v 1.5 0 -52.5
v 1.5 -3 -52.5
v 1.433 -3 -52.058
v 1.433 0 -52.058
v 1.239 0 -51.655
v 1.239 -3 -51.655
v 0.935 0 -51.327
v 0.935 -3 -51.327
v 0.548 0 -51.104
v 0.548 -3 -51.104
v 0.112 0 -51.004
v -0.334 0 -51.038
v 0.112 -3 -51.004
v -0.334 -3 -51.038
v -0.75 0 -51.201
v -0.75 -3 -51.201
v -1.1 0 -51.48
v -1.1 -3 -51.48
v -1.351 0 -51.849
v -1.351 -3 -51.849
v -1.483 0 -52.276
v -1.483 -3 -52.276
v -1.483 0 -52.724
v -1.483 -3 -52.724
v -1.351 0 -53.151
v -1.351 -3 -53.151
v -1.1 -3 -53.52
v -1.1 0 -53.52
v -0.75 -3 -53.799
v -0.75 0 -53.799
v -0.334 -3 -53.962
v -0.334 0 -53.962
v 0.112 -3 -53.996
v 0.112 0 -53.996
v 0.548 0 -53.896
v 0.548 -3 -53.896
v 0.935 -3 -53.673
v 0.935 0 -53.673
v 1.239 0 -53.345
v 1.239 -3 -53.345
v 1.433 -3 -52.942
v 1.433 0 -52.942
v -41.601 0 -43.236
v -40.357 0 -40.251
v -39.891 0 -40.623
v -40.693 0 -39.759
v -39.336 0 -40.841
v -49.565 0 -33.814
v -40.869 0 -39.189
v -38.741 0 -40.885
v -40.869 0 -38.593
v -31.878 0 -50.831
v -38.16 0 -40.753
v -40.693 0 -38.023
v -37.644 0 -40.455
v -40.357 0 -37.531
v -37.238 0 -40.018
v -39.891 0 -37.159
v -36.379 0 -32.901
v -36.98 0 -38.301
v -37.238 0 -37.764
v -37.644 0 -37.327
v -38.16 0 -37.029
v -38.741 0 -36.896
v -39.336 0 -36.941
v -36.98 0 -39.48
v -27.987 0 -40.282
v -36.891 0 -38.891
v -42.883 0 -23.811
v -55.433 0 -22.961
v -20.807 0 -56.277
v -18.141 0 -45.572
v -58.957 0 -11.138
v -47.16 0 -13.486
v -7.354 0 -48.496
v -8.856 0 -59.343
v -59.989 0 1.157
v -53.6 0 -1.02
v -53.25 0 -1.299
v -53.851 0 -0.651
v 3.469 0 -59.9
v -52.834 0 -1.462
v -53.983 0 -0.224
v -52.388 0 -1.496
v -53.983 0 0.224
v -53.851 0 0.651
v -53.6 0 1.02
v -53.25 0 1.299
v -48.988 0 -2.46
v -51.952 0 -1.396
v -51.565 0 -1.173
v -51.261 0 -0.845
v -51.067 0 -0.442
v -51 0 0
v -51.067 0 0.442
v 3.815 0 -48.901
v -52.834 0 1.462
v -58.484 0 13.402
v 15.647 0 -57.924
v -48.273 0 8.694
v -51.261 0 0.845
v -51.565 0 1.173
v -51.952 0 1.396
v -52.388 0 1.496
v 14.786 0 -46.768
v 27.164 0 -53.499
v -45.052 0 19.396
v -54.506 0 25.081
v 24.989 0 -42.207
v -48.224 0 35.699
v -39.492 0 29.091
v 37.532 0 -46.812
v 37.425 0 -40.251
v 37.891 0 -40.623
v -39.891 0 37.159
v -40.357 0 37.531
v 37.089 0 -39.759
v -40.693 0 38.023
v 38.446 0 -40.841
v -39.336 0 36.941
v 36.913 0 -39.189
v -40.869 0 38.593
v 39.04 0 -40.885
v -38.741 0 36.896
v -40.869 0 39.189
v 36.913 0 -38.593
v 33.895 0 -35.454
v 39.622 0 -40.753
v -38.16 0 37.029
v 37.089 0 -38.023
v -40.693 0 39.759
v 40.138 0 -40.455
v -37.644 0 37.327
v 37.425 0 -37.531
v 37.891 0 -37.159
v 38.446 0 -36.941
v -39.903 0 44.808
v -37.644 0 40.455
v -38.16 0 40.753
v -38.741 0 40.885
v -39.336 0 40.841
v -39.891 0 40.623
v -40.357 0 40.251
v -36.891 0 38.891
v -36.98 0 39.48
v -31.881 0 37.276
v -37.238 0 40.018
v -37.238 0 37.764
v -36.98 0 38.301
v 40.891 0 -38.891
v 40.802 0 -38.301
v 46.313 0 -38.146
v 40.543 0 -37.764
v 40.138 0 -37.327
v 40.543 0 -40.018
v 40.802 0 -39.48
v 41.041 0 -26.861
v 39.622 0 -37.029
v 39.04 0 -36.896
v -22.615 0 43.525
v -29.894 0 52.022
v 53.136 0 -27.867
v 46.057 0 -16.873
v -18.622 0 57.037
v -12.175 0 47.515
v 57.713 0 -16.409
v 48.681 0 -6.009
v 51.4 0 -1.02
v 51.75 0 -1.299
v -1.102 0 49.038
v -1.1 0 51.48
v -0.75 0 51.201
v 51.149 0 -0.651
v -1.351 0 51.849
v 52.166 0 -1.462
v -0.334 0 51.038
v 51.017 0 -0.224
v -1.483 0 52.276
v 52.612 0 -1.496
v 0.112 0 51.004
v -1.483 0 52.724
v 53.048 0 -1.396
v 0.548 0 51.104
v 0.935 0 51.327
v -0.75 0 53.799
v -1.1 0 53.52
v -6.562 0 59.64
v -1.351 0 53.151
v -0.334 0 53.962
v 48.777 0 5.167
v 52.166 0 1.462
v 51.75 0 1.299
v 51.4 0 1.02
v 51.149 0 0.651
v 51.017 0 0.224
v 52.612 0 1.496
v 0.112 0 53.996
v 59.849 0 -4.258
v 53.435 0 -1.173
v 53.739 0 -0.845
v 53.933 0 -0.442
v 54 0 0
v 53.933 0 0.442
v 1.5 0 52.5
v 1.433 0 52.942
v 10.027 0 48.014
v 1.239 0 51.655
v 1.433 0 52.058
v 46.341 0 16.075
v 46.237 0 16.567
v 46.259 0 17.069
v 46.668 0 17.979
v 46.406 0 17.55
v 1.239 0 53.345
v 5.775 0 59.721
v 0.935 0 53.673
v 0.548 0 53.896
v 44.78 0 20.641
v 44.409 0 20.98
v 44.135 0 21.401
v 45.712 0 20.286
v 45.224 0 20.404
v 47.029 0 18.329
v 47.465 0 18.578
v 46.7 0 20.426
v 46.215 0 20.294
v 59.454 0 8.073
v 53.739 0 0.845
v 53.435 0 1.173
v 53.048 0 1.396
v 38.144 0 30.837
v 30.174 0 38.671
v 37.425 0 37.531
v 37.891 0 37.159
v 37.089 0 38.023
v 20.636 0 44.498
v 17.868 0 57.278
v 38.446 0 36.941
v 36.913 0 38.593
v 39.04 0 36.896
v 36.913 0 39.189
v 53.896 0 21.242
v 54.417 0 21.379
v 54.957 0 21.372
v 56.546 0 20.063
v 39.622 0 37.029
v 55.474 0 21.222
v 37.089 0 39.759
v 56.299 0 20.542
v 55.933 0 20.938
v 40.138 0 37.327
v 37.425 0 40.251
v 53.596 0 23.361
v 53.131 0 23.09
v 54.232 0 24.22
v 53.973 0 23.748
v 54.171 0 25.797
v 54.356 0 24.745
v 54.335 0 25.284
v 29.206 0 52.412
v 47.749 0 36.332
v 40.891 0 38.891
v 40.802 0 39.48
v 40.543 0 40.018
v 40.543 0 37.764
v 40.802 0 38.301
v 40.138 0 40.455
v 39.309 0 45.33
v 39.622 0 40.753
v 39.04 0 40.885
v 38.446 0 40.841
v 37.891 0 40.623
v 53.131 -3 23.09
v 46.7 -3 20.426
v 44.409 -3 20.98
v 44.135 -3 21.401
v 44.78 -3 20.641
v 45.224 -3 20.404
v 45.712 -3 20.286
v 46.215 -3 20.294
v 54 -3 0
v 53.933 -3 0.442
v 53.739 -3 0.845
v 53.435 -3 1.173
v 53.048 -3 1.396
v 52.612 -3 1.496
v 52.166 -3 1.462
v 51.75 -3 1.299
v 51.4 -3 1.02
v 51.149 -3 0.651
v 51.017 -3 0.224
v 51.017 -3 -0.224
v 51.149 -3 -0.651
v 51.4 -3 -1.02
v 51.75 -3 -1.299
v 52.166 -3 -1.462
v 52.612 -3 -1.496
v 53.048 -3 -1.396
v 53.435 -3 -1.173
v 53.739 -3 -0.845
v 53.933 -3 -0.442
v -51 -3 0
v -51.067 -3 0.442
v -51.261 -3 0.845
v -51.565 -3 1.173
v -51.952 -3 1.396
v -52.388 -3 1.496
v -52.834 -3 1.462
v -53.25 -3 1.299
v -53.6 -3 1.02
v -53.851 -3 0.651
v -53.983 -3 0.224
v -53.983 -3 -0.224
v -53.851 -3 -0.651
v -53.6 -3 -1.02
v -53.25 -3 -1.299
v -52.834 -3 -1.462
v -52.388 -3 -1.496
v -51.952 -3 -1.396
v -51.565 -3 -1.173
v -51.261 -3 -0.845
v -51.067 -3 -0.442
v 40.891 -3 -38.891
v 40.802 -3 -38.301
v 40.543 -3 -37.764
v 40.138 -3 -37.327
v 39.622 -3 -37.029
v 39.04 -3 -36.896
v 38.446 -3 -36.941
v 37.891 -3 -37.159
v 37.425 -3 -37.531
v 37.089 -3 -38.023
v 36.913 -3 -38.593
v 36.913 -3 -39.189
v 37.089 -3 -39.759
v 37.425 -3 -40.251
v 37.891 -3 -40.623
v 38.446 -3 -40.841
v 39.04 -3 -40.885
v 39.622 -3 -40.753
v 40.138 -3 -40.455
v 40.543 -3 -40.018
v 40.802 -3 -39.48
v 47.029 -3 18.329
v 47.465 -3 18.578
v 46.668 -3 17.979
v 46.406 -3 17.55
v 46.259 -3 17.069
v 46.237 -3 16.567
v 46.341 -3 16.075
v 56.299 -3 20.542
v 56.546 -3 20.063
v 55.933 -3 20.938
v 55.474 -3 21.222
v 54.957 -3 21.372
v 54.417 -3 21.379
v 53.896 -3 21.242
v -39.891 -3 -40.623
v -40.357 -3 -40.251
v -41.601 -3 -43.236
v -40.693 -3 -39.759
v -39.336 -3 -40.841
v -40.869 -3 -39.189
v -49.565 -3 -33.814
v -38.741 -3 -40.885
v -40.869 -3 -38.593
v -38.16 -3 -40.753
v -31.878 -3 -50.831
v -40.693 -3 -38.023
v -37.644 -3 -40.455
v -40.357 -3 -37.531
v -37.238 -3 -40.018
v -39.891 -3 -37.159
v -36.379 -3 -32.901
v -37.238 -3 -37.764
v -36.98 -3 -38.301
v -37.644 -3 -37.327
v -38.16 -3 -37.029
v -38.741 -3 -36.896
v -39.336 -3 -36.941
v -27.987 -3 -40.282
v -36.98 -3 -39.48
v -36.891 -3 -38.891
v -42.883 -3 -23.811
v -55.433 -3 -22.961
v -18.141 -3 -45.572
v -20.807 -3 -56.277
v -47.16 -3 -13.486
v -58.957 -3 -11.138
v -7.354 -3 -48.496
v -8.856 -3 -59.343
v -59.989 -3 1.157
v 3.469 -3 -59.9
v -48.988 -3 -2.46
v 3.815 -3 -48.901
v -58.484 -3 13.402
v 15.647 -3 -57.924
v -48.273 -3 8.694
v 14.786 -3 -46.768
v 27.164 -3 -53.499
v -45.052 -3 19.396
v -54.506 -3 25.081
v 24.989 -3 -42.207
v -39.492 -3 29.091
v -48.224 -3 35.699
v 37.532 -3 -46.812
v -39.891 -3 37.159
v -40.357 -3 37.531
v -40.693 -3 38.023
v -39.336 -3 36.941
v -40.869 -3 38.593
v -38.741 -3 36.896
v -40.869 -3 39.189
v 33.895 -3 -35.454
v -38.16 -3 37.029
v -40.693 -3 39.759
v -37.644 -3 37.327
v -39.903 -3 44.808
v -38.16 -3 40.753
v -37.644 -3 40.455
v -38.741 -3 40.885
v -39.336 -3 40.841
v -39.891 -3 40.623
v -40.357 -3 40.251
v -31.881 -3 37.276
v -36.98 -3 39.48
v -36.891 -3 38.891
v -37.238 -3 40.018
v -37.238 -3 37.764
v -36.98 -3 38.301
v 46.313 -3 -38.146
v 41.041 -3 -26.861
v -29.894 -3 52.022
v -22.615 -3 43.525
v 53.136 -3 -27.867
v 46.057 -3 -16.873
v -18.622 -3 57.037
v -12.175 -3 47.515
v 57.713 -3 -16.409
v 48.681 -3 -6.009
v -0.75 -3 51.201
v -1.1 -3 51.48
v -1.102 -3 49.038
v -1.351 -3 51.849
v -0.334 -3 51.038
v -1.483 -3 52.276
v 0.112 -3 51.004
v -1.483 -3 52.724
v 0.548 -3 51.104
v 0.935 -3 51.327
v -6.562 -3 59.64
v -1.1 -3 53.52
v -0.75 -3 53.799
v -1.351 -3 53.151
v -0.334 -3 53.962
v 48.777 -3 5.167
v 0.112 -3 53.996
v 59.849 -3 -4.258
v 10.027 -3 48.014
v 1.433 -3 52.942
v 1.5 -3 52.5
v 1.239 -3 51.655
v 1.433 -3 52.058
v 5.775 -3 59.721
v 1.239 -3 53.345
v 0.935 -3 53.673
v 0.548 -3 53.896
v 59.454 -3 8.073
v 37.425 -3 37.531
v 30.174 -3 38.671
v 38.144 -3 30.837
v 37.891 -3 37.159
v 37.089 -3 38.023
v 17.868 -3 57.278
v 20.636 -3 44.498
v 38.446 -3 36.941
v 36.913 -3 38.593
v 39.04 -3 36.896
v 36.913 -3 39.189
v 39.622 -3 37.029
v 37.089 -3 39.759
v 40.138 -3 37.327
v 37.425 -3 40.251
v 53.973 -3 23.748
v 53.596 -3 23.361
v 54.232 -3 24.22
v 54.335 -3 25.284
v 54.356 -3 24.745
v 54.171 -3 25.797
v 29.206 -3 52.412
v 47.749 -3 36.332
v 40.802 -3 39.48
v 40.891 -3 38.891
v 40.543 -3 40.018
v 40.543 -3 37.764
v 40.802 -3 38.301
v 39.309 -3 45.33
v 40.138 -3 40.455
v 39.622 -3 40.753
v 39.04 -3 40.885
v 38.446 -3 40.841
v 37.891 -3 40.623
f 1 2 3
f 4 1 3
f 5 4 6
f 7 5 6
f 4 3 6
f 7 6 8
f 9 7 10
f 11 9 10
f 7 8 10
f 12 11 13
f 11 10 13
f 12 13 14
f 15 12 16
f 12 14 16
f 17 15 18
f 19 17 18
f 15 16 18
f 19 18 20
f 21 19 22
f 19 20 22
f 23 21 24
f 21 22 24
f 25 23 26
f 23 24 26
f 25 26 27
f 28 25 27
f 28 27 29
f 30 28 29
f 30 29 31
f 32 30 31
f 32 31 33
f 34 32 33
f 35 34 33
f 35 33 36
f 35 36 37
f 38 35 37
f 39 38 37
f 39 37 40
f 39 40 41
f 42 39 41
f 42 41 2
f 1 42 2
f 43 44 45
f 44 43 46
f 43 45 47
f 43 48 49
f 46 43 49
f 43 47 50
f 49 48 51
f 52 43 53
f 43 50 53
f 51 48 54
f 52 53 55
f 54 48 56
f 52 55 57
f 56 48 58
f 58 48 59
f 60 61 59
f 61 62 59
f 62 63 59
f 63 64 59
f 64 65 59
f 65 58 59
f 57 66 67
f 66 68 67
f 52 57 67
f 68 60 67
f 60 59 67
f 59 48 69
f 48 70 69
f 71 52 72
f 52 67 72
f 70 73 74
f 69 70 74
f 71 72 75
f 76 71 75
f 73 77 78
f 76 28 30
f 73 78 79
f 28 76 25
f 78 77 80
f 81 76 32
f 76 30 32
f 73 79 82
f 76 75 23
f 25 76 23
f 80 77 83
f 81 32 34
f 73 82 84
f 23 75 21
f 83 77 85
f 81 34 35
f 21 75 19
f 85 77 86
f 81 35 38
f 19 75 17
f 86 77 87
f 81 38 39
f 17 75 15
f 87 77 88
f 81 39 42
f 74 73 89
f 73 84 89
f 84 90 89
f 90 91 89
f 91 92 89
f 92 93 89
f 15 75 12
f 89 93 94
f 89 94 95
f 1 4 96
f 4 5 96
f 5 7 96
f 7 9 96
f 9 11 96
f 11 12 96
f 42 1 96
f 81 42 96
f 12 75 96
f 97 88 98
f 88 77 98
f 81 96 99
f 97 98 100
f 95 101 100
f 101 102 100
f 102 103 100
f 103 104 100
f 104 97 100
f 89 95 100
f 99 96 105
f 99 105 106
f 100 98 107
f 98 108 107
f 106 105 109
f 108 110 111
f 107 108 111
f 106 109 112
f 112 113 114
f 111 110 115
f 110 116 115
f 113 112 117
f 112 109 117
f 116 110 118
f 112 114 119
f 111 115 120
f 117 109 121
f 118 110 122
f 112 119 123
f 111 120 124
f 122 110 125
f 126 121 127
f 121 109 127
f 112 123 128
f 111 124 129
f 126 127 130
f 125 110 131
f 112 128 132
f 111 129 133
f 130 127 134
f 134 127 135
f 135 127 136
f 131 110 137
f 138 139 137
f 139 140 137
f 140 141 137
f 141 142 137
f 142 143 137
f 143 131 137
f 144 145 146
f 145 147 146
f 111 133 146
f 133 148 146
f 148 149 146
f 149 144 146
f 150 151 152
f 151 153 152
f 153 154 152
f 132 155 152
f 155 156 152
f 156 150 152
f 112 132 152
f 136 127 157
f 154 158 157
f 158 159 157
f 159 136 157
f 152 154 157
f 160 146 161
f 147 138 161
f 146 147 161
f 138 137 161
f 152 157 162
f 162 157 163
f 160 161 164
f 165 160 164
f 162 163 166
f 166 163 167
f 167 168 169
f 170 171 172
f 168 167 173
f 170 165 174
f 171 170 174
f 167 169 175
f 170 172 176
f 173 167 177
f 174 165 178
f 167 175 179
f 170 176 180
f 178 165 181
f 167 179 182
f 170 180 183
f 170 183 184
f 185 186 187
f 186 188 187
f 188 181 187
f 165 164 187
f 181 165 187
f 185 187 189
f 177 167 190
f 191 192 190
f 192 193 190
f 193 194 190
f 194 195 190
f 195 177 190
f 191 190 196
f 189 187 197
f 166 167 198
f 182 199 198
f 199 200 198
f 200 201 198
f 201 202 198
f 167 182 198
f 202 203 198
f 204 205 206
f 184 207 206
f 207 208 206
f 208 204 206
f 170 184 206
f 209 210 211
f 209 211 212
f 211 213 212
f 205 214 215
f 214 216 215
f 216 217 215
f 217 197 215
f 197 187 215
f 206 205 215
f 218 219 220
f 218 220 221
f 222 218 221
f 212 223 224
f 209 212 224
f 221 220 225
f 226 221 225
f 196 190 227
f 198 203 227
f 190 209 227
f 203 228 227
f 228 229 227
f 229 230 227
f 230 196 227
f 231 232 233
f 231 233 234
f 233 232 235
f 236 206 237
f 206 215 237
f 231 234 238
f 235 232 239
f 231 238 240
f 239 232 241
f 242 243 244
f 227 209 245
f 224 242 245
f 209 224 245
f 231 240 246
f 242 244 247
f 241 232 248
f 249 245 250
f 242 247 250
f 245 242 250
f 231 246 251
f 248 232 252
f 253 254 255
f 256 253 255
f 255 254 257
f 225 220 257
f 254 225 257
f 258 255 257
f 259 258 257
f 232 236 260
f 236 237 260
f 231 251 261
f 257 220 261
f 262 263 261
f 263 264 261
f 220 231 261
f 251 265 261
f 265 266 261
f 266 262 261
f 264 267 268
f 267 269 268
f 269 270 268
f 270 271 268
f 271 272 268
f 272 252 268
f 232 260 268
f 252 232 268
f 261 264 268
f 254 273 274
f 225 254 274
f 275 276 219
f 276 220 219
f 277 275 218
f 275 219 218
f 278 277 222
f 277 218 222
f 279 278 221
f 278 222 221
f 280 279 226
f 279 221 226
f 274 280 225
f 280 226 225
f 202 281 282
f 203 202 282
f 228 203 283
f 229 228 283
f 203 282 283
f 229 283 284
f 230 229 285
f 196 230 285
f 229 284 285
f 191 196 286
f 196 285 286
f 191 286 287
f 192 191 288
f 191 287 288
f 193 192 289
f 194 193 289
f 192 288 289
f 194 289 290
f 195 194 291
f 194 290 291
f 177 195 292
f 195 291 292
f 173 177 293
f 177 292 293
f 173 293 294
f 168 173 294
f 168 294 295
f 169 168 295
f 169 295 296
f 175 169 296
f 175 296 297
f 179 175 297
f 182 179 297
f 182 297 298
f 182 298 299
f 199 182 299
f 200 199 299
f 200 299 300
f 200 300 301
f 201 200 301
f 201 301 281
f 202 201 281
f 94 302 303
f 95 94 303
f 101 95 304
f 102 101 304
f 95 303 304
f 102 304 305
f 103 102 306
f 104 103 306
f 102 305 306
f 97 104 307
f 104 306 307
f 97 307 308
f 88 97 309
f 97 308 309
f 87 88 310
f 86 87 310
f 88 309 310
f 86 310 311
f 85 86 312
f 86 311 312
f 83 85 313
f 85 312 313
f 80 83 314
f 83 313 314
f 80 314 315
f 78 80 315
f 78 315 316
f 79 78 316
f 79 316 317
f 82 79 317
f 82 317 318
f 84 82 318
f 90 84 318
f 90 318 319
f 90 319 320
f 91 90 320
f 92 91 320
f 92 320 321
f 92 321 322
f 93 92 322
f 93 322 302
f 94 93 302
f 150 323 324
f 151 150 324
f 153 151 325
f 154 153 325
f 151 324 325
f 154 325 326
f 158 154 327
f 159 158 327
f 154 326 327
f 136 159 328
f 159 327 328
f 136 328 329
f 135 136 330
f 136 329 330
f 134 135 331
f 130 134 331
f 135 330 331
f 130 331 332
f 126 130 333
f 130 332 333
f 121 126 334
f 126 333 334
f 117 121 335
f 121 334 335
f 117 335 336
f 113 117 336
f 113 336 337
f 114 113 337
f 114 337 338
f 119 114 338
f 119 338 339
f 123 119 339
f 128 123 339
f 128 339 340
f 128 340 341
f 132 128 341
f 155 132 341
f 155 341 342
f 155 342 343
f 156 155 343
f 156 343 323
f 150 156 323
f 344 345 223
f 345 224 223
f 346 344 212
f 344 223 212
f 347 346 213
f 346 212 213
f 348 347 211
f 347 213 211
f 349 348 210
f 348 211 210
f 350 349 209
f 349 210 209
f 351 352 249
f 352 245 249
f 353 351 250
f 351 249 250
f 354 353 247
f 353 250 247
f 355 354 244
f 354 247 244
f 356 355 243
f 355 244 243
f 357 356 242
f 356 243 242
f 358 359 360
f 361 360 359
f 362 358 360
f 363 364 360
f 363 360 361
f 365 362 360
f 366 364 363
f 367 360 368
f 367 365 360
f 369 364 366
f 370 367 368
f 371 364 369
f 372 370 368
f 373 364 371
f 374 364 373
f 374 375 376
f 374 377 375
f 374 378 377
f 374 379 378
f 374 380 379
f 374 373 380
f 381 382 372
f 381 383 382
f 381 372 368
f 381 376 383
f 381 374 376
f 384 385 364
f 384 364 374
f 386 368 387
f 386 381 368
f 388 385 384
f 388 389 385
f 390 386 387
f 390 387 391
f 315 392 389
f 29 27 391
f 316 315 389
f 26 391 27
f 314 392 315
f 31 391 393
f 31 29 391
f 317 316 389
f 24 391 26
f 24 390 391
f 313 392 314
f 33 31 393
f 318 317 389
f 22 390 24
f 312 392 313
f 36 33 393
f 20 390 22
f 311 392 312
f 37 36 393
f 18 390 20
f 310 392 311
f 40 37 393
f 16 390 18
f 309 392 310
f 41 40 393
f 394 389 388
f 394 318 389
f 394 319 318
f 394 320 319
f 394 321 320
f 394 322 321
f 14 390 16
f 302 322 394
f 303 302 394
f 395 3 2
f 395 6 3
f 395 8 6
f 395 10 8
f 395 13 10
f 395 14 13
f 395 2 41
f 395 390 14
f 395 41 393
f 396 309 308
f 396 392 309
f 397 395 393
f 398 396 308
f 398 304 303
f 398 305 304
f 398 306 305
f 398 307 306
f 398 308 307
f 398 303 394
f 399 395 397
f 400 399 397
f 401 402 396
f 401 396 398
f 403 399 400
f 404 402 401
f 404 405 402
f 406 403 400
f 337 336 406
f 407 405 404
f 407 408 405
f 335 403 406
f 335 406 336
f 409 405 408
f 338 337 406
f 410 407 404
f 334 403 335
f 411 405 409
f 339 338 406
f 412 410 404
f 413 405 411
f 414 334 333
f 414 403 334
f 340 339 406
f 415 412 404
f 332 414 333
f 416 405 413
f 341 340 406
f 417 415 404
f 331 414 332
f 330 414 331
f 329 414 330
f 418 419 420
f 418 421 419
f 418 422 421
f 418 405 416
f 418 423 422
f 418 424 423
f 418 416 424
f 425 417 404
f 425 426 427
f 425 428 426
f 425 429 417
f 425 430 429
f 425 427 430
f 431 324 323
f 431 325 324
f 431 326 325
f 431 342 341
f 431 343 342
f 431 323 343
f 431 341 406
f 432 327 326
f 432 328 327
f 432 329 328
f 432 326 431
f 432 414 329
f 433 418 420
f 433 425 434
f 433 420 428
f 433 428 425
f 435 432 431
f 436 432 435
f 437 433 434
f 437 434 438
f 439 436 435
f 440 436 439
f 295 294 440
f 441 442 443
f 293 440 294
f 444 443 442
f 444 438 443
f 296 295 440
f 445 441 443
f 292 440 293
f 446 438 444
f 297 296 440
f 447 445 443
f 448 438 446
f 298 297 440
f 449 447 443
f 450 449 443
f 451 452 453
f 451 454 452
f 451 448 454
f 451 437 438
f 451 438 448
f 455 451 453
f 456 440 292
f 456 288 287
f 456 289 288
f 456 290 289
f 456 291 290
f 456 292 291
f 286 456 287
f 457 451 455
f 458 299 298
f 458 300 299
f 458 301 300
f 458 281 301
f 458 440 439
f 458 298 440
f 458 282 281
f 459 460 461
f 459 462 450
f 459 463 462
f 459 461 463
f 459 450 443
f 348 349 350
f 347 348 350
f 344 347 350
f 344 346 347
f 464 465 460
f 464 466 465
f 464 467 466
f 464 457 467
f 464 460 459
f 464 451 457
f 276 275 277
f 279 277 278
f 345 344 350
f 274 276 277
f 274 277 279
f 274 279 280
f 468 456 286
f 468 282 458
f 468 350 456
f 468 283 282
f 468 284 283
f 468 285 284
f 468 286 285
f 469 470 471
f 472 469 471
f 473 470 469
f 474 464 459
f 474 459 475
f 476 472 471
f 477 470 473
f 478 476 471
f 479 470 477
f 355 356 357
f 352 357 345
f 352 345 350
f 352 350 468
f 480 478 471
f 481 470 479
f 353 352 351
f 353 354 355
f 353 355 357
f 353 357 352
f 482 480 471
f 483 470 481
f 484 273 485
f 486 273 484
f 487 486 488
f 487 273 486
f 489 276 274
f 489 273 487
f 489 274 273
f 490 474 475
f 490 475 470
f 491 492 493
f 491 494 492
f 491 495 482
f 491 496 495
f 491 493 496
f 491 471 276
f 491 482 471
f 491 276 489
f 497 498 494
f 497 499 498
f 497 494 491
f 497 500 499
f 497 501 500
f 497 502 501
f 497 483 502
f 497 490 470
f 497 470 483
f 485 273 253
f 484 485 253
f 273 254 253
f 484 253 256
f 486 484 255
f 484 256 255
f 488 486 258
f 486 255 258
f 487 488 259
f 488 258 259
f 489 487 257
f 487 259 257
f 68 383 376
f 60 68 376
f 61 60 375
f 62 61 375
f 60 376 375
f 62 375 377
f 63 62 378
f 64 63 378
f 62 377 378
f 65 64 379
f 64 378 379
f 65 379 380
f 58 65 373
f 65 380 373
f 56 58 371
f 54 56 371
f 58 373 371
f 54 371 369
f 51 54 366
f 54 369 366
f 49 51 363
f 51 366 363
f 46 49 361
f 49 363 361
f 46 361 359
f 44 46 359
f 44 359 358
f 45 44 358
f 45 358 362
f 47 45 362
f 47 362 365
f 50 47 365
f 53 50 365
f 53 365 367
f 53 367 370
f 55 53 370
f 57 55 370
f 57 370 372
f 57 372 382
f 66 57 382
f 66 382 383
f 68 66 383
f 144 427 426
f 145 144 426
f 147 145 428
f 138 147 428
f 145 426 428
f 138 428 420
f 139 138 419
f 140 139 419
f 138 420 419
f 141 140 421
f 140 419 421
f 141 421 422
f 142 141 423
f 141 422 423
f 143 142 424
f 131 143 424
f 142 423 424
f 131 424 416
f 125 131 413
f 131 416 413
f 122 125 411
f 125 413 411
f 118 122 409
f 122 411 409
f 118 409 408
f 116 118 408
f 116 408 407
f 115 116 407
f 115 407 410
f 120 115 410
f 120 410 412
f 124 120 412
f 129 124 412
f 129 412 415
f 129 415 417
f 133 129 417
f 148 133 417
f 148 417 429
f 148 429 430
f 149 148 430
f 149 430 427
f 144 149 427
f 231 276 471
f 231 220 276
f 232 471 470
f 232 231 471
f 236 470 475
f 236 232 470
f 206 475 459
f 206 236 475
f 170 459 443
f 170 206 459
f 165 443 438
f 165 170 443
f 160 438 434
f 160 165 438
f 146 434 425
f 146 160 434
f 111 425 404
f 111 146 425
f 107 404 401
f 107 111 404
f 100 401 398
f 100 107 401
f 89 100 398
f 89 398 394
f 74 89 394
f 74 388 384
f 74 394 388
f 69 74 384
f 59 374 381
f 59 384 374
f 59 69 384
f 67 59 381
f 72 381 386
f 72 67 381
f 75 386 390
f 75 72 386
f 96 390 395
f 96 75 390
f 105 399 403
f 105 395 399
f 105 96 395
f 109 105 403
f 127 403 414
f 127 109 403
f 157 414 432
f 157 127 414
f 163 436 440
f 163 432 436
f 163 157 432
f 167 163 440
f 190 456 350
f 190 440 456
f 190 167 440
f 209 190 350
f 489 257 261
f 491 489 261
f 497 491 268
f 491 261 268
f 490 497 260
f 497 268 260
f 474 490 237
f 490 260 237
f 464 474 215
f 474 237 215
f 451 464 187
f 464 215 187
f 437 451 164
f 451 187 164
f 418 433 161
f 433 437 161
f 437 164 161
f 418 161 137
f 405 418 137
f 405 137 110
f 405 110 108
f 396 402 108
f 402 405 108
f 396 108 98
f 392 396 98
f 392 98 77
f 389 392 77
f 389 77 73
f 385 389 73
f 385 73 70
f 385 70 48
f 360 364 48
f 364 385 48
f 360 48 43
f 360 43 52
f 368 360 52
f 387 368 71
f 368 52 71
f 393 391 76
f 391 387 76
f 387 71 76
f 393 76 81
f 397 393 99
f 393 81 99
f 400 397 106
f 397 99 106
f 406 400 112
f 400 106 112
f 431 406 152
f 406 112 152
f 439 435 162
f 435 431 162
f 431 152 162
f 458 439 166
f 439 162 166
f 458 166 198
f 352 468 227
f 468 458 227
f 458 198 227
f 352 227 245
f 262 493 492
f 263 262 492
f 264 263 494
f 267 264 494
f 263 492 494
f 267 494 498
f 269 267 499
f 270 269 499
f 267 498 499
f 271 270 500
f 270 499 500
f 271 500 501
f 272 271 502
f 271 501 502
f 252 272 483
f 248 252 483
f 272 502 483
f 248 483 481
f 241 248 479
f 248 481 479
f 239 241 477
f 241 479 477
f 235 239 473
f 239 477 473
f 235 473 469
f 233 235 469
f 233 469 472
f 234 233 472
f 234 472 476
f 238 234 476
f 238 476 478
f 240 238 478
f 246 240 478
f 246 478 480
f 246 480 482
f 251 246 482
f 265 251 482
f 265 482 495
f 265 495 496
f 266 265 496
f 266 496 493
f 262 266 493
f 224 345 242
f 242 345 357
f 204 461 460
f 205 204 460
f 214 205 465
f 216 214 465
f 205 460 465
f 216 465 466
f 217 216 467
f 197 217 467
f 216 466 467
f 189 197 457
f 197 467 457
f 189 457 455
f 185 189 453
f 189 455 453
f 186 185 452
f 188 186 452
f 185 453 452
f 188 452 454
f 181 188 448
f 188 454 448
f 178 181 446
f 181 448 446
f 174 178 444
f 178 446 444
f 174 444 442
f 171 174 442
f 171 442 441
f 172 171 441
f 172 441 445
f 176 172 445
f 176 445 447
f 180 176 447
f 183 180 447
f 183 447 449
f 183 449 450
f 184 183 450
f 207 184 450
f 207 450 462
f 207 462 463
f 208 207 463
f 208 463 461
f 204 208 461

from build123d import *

# Parameters (mm, degrees)
F0_R     = 60
F0_R_2   = 49.05
F1_DEPTH = 3
F2_R     = 1.5
F2_R_2   = 2
F3_DEPTH = 3.001
F4_R     = 2


with BuildPart() as f1:
    # F0 (on Front) → F1 (new body)
    with BuildSketch(Plane.XZ):
        Circle(F0_R)
        Circle(F0_R_2, mode=Mode.SUBTRACT)
    extrude(amount=F1_DEPTH)

    # F2 (on face) → F3 (cut, through all)
    with BuildSketch(Plane.XZ.offset(3)):
        with Locations((-52.5, 0)):
            Circle(F2_R)
        with Locations((0, 52.5)):
            Circle(F2_R)
        with Locations((52.5, 0)):
            Circle(F2_R)
        with Locations((0, -52.5)):
            Circle(F2_R)
        Polygon((59.6694861809, 25.7983026362), (40.3142099748, 17.7810847282), (40.6968934071, 16.8572051957), (41.0795768395, 15.9333256632), (60.4348530456, 23.9505435712), (60.0521696132, 24.8744231037), align=None)
        with Locations((-38.8908729653, 38.8908729653)):
            Circle(F2_R_2)
        with Locations((-38.8908729653, -38.8908729653)):
            Circle(F2_R_2)
        with Locations((38.8908729653, -38.8908729653)):
            Circle(F2_R_2)
        with Locations((38.8908729653, 38.8908729653)):
            Circle(F2_R_2)
    extrude(amount=-F3_DEPTH, mode=Mode.SUBTRACT)

    # F4
    f4_edges = [f1.edges().sort_by_distance(p)[0] for p in [
        (55.042389, -1.5, 23.881696),
        (55.807756, -1.5, 22.033937),
        (44.924189, -1.5, 19.690601),
        (45.689556, -1.5, 17.842841),
    ]]
    fillet(f4_edges, radius=F4_R)


solid = f1.part
